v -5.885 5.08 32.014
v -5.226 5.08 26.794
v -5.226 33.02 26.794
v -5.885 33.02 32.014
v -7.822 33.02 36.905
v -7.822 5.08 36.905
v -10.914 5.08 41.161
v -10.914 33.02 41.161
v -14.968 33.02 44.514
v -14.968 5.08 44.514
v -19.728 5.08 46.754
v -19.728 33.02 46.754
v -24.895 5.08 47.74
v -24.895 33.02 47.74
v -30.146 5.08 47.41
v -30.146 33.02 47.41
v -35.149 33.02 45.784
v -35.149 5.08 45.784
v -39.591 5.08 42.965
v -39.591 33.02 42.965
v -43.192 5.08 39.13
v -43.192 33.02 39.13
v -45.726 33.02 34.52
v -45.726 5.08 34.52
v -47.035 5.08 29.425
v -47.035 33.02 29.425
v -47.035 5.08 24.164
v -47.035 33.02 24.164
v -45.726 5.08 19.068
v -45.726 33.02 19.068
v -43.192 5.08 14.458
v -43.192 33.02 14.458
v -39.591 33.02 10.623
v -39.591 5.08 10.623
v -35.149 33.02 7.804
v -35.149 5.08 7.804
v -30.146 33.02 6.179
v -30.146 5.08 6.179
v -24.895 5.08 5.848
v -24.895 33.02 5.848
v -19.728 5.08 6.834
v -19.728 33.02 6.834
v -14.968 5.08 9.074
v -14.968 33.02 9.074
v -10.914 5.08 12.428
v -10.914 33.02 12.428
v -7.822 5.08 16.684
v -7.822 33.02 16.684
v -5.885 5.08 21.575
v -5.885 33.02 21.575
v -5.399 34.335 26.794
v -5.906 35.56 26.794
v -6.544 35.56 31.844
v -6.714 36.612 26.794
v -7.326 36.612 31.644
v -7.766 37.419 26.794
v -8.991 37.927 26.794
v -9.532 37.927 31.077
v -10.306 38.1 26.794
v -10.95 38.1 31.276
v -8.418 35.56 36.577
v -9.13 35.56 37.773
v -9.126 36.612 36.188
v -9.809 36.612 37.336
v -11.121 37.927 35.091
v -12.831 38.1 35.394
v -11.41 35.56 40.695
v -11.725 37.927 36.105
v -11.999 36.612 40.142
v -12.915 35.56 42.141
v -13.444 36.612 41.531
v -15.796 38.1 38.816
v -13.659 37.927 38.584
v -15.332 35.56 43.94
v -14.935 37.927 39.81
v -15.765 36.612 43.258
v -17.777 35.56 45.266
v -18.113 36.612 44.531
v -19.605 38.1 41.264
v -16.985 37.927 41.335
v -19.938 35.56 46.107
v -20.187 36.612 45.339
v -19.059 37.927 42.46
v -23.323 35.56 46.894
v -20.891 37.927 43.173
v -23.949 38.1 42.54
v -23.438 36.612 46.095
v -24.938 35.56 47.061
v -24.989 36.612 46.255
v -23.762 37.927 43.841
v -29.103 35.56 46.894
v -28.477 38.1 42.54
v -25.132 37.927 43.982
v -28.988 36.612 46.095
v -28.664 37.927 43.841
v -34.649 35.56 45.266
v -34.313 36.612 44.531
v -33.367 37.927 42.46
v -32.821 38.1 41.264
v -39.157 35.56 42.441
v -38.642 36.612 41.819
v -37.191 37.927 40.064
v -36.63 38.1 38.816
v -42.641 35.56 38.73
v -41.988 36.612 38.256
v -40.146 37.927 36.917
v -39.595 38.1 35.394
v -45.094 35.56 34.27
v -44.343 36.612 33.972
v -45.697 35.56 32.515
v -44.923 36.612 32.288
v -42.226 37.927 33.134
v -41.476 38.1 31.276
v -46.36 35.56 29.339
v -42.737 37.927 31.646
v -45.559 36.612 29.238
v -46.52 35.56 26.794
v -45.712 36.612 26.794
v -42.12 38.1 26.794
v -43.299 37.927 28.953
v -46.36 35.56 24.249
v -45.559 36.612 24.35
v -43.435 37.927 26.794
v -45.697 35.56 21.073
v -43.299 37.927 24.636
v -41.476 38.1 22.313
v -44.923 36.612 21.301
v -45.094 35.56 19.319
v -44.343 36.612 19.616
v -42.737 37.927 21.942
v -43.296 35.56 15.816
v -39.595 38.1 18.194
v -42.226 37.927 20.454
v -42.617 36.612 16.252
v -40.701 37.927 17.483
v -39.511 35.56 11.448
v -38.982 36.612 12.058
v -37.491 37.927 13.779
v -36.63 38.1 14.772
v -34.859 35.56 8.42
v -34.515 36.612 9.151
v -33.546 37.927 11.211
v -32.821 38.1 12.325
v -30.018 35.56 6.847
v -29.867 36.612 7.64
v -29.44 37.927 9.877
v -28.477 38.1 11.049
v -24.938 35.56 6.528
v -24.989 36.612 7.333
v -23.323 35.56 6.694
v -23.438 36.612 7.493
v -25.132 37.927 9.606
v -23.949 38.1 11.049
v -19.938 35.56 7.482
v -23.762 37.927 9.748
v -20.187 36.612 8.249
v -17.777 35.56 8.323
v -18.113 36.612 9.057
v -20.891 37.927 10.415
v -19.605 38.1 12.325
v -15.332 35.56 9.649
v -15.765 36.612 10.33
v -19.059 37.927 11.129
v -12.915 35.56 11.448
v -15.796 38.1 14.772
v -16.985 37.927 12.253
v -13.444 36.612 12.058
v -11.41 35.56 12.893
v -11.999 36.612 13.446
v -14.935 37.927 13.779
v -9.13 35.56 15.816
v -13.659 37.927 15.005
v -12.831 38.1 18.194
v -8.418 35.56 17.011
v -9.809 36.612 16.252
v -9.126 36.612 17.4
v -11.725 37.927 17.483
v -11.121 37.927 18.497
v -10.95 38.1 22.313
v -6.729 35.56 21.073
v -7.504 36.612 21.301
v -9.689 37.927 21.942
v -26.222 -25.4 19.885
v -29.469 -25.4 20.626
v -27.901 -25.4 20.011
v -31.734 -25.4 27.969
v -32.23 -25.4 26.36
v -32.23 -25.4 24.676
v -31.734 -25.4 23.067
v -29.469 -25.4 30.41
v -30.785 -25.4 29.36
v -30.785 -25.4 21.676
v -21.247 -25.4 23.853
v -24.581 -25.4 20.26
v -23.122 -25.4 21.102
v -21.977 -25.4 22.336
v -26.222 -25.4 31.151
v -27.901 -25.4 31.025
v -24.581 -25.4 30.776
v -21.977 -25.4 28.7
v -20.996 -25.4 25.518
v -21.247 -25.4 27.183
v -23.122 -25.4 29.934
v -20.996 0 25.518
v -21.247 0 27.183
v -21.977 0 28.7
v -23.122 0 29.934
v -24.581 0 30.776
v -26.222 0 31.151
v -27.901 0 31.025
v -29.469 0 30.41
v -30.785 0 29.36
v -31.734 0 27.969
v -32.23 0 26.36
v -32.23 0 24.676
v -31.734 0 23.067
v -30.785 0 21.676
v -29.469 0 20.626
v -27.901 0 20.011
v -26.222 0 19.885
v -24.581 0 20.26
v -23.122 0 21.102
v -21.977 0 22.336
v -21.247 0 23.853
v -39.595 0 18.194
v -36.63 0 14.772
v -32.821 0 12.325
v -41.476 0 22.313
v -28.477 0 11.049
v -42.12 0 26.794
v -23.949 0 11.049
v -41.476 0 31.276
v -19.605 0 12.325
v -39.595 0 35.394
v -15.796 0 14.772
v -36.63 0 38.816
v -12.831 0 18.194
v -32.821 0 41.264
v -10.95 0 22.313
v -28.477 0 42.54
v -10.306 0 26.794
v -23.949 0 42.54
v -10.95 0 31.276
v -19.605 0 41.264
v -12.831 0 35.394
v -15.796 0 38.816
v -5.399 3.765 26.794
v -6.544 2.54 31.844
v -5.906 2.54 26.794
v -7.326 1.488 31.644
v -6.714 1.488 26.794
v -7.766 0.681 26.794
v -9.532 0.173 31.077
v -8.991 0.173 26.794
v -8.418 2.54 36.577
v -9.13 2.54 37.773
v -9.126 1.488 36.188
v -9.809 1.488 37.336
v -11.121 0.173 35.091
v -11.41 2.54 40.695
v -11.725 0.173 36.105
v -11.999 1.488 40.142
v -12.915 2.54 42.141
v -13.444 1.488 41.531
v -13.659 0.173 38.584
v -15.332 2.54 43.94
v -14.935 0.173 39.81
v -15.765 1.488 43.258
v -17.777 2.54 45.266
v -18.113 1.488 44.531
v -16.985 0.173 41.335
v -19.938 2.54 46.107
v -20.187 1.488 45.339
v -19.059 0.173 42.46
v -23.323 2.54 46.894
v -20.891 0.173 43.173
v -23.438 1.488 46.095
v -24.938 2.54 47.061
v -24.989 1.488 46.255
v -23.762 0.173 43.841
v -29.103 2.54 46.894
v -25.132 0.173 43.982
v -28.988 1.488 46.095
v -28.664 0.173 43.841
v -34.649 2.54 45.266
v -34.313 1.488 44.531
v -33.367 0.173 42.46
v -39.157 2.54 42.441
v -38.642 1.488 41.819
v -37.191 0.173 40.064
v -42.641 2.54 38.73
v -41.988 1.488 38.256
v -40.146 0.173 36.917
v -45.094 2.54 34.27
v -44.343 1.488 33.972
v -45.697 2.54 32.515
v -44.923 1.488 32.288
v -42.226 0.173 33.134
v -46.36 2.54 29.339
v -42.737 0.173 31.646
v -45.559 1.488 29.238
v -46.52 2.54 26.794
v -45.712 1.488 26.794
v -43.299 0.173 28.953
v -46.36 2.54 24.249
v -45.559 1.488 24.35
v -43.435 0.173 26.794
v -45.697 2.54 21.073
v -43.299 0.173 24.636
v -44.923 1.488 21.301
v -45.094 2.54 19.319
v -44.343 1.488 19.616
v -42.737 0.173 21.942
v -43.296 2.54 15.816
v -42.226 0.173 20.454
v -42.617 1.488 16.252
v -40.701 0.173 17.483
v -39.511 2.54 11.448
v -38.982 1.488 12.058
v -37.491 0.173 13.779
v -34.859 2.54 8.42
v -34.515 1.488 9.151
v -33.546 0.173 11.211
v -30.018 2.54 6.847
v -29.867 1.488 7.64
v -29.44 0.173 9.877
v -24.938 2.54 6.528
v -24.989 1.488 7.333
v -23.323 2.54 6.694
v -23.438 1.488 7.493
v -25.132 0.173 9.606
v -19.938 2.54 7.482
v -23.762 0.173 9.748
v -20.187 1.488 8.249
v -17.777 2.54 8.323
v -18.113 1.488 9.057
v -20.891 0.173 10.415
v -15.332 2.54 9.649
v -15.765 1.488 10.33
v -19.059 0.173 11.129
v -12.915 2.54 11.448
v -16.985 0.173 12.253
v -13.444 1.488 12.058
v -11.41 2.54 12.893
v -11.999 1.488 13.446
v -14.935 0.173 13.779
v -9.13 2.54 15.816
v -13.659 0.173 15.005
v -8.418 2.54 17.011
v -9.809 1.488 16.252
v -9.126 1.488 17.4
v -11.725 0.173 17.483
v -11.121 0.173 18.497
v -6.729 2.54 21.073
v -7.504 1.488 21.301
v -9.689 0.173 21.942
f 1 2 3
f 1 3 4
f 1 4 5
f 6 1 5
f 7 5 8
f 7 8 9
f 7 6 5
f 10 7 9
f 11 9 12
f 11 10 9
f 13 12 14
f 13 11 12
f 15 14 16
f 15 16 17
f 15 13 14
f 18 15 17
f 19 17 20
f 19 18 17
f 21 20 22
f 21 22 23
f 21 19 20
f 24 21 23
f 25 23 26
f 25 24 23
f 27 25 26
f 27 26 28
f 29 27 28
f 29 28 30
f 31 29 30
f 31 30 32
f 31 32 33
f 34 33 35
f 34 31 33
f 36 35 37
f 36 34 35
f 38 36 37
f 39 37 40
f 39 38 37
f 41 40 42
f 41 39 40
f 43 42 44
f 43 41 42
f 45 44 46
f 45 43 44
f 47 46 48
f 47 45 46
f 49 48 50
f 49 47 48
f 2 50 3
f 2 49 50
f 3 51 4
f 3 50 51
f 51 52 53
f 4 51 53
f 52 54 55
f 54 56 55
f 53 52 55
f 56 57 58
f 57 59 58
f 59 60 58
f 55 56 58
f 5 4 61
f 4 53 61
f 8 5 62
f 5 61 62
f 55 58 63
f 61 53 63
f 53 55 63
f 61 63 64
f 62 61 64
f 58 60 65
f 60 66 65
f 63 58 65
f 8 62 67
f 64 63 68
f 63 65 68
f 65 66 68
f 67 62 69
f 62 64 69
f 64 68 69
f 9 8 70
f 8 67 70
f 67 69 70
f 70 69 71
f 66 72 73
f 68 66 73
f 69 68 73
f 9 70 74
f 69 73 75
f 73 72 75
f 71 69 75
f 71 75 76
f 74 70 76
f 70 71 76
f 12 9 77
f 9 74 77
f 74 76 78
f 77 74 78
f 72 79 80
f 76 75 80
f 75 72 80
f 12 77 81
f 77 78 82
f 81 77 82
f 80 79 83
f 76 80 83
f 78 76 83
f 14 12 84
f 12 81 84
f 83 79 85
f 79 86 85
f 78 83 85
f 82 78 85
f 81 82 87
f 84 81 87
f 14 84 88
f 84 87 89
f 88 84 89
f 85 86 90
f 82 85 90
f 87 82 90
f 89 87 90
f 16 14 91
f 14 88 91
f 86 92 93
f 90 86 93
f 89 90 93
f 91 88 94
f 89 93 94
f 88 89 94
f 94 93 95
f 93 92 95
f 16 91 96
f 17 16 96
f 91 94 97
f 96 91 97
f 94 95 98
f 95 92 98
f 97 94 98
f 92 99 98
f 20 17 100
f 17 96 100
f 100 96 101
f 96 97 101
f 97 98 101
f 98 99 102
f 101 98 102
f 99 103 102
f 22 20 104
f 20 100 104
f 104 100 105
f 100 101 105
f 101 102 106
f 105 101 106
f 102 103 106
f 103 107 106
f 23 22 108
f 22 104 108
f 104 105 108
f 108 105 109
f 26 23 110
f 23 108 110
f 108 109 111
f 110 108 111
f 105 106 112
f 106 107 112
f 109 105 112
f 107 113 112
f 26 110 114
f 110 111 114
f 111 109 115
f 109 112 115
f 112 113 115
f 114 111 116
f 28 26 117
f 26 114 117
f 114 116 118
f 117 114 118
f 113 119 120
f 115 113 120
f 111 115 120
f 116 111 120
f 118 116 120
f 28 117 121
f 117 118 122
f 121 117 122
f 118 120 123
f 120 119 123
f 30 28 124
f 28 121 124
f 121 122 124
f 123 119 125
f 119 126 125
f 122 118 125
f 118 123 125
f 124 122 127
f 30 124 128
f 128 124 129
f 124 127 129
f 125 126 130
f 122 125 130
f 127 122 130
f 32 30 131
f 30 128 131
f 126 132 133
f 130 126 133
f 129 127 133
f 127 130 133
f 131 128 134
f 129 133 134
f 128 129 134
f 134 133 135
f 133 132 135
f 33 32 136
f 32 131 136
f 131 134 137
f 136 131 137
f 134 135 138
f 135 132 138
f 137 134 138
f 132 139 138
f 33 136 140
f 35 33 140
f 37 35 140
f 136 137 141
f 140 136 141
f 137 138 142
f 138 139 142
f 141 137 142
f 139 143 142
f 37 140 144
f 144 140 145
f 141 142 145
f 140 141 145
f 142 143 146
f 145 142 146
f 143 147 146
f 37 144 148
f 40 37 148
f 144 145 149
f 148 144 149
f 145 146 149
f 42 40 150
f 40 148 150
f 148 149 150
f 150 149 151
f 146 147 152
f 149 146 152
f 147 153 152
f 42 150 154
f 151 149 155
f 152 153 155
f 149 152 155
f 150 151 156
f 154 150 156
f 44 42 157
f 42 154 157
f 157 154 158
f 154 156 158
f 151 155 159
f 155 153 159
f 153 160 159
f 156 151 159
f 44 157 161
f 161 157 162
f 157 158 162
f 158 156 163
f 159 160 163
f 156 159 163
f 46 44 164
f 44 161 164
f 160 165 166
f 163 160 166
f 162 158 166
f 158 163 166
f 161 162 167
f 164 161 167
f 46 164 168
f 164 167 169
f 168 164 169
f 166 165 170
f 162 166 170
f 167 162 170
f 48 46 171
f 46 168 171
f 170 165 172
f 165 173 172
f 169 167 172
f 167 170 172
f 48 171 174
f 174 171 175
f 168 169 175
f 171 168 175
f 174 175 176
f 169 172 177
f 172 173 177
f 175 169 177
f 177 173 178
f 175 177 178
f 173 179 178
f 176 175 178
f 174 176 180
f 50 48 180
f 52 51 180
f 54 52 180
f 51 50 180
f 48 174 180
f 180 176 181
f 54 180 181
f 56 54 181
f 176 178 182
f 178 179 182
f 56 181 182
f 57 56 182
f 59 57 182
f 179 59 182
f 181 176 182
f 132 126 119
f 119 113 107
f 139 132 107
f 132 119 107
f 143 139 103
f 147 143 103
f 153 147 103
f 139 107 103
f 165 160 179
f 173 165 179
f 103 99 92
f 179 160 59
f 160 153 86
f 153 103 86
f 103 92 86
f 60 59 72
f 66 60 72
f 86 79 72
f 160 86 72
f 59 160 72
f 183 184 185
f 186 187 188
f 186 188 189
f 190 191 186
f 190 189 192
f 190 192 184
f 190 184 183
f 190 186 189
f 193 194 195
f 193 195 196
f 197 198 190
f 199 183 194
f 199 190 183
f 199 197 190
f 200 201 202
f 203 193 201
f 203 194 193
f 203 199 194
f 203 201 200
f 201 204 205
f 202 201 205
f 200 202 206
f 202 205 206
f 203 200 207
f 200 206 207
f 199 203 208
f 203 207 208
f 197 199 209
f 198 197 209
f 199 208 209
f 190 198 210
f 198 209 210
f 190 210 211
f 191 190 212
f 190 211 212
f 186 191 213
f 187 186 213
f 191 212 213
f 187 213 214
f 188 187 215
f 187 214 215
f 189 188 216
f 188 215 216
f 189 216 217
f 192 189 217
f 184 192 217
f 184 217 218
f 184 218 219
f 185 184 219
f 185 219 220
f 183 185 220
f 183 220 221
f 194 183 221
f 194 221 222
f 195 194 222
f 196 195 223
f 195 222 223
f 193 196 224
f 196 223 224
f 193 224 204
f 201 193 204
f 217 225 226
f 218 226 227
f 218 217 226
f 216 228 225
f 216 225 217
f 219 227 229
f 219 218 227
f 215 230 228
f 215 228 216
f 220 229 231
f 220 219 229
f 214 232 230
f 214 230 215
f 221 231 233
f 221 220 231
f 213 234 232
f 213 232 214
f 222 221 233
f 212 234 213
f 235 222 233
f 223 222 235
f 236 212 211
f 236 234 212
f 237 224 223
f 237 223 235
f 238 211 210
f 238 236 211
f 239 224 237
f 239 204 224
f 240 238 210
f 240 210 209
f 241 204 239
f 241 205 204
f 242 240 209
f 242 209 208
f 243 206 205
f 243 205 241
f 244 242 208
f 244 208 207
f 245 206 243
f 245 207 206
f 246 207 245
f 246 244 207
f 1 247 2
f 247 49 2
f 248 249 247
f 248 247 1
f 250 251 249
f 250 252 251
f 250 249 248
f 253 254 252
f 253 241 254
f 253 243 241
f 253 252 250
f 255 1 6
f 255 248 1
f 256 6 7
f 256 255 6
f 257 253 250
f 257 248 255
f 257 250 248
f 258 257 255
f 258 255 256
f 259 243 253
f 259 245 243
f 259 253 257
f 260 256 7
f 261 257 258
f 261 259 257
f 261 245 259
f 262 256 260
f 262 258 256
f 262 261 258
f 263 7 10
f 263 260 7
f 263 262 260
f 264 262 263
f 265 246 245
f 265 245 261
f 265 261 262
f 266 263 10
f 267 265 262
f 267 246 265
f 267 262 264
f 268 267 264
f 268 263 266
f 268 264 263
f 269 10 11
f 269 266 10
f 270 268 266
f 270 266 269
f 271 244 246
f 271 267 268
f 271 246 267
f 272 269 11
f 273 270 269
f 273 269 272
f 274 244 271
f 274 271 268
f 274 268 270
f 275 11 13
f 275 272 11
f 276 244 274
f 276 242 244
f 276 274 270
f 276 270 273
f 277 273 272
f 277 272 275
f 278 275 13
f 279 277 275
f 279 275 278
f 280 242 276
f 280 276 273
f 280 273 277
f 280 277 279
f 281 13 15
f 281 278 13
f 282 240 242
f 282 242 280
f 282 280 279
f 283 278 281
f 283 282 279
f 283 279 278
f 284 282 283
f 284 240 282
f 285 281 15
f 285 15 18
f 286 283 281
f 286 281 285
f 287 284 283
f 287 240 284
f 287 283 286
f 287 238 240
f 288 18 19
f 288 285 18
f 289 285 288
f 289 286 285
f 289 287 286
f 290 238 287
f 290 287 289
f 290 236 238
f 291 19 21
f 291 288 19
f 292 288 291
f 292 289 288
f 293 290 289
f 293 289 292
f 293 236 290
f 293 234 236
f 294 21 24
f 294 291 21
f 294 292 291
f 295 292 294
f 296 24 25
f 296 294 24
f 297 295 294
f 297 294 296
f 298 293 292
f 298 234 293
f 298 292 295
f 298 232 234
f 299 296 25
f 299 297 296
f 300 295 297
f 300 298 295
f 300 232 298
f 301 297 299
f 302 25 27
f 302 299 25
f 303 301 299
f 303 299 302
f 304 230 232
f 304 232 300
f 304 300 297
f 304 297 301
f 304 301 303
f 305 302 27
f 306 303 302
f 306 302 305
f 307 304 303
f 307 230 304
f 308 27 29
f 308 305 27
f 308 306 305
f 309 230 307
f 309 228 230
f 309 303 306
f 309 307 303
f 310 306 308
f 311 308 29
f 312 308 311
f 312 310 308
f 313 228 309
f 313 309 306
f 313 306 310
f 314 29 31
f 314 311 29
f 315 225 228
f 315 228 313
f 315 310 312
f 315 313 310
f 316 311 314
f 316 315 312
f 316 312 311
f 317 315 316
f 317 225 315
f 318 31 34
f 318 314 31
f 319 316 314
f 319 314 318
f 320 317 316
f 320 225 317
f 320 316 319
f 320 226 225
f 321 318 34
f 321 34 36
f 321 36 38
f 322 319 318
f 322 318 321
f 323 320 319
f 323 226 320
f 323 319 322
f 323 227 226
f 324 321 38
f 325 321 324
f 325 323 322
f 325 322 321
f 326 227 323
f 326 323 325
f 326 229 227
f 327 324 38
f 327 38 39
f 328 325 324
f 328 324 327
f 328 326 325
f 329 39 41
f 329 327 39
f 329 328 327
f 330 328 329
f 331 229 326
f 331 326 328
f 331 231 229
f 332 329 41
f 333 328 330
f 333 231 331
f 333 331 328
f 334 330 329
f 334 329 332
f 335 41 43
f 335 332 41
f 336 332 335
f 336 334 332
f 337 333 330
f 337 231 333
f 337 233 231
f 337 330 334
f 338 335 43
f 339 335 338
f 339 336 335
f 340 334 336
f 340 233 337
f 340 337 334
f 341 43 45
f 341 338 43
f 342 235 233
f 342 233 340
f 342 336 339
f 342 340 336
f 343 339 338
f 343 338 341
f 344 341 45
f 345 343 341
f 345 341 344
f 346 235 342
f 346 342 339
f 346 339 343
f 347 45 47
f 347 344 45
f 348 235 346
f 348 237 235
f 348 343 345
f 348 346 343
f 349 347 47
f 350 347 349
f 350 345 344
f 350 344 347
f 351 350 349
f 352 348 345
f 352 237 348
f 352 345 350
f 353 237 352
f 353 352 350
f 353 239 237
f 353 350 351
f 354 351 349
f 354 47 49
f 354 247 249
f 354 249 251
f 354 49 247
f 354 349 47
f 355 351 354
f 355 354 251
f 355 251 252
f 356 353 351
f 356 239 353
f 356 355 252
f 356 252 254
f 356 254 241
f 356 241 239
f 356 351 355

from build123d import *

# Parameters (mm, degrees)
F0_R     = 20.987211
F1_DEPTH = 38.1
F2_R     = 5.08
F3_R     = 5.64864
F4_DEPTH = 25.4


with BuildPart() as f1:
    # F0 (on Front) → F1 (new body)
    with BuildSketch(Plane.XZ):
        with Locations((-26.213065, 26.794255)):
            Circle(F0_R)
    extrude(amount=-F1_DEPTH)

    # F2
    f2_edges = [f1.edges().sort_by_distance(p)[0] for p in [
        (-47.200276, 0, 26.794255),
        (-5.225854, 19.05, 26.794255),
        (-47.200276, 38.1, 26.794255),
    ]]
    fillet(f2_edges, radius=F2_R)

    # F3 (on Front) → F4 (join)
    with BuildSketch(Plane.XZ):
        with Locations((-26.644299, 25.517916)):
            Circle(F3_R)
    extrude(amount=F4_DEPTH)


solid = f1.part
